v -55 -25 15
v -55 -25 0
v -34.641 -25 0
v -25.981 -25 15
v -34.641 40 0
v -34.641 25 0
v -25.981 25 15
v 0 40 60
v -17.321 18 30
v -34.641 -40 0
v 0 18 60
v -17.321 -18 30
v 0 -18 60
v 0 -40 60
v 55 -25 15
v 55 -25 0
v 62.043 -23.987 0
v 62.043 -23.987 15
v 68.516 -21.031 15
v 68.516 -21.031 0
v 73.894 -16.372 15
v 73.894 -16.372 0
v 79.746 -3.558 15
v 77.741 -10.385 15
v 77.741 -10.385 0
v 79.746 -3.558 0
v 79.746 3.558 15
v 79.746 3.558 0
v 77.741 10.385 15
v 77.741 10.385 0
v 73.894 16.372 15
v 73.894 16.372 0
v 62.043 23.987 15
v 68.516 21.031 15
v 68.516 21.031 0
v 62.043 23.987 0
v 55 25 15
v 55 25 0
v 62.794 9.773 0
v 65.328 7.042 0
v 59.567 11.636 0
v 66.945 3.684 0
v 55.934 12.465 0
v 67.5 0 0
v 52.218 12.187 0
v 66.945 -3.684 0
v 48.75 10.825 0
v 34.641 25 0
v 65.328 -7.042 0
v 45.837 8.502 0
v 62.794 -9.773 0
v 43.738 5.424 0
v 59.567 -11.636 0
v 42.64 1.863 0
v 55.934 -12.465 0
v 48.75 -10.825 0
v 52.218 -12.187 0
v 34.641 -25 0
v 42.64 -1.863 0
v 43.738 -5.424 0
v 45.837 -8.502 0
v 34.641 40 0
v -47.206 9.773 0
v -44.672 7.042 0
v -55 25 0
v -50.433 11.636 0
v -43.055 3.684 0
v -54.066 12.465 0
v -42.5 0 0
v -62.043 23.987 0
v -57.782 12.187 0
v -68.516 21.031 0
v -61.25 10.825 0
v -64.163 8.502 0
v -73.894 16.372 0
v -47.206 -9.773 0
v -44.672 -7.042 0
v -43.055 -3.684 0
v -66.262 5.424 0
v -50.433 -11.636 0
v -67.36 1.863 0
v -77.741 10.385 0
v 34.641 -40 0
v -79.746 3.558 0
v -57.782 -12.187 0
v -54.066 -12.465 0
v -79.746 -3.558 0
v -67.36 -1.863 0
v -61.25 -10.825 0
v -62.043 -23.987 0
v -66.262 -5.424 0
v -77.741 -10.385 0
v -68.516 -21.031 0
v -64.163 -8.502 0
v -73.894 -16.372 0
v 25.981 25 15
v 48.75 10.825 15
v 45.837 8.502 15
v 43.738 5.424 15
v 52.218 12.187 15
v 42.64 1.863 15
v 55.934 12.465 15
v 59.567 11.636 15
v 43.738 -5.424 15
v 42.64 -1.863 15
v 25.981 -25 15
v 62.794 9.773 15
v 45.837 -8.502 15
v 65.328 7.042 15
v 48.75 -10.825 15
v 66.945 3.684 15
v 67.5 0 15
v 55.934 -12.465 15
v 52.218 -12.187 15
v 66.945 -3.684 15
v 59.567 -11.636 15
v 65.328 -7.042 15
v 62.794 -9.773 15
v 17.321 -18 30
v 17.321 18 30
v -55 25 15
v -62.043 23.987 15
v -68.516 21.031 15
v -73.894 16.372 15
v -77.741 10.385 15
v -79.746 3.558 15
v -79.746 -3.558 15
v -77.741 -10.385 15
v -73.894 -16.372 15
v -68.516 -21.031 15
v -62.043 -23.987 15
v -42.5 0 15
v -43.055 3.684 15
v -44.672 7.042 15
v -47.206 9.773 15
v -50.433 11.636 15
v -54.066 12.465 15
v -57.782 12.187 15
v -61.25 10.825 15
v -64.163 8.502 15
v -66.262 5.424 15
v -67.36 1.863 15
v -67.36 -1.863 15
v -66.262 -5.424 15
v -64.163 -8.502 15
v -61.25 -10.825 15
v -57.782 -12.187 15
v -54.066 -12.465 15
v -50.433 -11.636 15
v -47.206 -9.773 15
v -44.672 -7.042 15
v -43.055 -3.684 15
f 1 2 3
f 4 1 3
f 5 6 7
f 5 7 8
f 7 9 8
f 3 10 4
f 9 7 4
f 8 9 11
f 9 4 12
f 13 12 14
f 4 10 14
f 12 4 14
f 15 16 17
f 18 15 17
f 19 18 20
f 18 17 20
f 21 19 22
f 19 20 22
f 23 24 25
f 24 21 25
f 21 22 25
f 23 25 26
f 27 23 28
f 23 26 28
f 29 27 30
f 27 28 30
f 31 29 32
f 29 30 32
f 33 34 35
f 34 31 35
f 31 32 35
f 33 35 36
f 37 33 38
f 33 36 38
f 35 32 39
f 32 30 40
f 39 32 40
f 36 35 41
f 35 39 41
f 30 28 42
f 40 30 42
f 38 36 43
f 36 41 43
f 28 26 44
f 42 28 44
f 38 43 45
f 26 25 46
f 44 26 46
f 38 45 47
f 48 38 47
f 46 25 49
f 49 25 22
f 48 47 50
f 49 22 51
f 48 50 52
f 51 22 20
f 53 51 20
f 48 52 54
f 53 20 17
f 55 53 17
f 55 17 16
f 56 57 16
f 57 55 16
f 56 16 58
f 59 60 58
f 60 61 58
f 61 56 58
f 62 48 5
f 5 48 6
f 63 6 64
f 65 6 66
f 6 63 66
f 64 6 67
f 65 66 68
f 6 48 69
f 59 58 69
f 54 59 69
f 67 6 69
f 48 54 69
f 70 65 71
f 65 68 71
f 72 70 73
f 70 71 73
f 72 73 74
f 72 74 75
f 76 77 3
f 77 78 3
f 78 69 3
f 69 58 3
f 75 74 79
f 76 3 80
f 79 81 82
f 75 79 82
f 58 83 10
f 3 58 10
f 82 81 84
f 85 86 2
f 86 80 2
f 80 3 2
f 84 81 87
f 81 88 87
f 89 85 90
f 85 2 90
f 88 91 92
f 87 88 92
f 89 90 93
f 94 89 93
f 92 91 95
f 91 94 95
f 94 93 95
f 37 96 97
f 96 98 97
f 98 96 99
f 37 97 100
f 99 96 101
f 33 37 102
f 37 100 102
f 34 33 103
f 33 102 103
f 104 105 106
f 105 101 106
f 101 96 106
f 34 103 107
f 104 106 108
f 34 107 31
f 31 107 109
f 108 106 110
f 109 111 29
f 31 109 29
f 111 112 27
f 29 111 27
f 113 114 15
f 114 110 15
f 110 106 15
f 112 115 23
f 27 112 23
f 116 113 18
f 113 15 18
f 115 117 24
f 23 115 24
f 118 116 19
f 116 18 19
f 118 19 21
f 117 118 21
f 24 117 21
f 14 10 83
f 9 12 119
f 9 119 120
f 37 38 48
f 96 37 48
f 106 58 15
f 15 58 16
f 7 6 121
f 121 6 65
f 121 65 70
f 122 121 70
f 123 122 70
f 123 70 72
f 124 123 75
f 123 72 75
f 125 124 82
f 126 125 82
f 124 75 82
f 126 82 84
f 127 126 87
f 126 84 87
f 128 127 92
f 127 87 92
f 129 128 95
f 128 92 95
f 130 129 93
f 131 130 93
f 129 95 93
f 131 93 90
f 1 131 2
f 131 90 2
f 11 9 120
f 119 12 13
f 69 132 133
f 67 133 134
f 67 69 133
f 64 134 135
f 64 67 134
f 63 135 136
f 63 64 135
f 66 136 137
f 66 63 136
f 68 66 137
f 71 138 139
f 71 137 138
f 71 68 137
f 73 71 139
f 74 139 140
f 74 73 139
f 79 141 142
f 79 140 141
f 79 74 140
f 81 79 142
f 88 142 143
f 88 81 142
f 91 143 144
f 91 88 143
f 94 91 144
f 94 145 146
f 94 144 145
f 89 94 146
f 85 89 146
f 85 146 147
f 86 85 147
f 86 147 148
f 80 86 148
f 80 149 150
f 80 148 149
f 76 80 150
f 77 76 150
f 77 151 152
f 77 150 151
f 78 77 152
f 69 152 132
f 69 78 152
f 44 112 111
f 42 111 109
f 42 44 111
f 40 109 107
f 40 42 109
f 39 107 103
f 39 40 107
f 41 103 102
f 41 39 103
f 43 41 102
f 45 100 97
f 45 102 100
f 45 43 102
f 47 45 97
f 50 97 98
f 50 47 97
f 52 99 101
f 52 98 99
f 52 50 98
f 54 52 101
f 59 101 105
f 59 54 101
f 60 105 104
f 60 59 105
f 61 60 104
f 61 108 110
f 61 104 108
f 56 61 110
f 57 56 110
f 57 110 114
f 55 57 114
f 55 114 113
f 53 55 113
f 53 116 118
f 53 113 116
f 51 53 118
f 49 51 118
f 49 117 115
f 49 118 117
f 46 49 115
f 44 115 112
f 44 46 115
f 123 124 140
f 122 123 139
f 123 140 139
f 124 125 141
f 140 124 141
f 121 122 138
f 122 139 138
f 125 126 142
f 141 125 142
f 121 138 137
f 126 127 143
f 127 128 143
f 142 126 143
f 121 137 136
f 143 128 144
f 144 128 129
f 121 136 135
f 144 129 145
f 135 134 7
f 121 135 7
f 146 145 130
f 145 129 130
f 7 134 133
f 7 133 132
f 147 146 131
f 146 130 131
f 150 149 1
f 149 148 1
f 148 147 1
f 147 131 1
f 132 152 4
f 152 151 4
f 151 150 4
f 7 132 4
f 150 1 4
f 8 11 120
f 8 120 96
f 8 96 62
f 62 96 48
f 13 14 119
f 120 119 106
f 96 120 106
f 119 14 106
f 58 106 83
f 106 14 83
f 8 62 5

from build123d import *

# Parameters (mm, degrees)
F0_R      = 12.5
F1_DEPTH  = 60
F2_W      = 25
F2_H      = 45
F3_DEPTH  = 80
F4_DEPTH  = 15
F6_DEPTH  = 15
F7_W      = 36
F7_H      = 30
F8_DEPTH  = 50
F8_FACE_W = 36
F8_FACE_H = 30
F9_DEPTH  = 25


with BuildPart() as f1:
    # F0 (on Top) → F1 (new body)
    with BuildSketch(Plane.XY):
        with BuildLine():
            Line((-55, -25), (55, -25))
            ThreePointArc((55, -25), (80, 0), (55, 25))
            Line((55, 25), (-55, 25))
            ThreePointArc((-55, 25), (-80, 0), (-55, -25))
        make_face()
        with Locations((-55, 0)):
            Circle(F0_R, mode=Mode.SUBTRACT)
        with Locations((55, 0)):
            Circle(F0_R, mode=Mode.SUBTRACT)
    extrude(amount=F1_DEPTH)

    # F2 (on face) → F3 (cut)
    with BuildSketch(Plane.XZ.offset(25)):
        with Locations((-67.5, 37.5)):
            Rectangle(F2_W, F2_H)
        Polygon((0, 60), (-55, 60), (-55, 15), (-25.980762, 15), align=None)
        Polygon((55, 60), (0, 60), (25.980762, 15), (55, 15), align=None)
        with Locations((67.5, 37.5)):
            Rectangle(F2_W, F2_H)
    extrude(amount=-F3_DEPTH, mode=Mode.SUBTRACT)

    # F2 (on face) → F4 (join)
    with BuildSketch(Plane.XZ.offset(25)):
        Polygon((25.980762, 15), (0, 60), (-25.980762, 15), (-34.641016, 0), (0, 0), (34.641016, 0), align=None)
    extrude(amount=F4_DEPTH)

    # F5 (on face) → F6 (join)
    with BuildSketch(Plane(origin=(0, 25, 0), x_dir=(-1, 0, 0), z_dir=(0, 1, 0))):
        Polygon((25.980762, 15), (0, 60), (-25.980762, 15), (-34.641016, 0), (34.641016, 0), align=None)
    extrude(amount=F6_DEPTH)

    # F7 (on Right) → F8 (cut)
    with BuildSketch(Plane.YZ):
        with Locations((0, 45)):
            Rectangle(F7_W, F7_H)
    extrude(amount=F8_DEPTH, mode=Mode.SUBTRACT)

    # F8_face (on face) → F9 (cut)
    with BuildSketch(Plane(origin=(0, 0, 45), x_dir=(0, 1, 0), z_dir=(1, 0, 0))):
        Rectangle(F8_FACE_W, F8_FACE_H)
    extrude(amount=-F9_DEPTH, mode=Mode.SUBTRACT)


solid = f1.part
